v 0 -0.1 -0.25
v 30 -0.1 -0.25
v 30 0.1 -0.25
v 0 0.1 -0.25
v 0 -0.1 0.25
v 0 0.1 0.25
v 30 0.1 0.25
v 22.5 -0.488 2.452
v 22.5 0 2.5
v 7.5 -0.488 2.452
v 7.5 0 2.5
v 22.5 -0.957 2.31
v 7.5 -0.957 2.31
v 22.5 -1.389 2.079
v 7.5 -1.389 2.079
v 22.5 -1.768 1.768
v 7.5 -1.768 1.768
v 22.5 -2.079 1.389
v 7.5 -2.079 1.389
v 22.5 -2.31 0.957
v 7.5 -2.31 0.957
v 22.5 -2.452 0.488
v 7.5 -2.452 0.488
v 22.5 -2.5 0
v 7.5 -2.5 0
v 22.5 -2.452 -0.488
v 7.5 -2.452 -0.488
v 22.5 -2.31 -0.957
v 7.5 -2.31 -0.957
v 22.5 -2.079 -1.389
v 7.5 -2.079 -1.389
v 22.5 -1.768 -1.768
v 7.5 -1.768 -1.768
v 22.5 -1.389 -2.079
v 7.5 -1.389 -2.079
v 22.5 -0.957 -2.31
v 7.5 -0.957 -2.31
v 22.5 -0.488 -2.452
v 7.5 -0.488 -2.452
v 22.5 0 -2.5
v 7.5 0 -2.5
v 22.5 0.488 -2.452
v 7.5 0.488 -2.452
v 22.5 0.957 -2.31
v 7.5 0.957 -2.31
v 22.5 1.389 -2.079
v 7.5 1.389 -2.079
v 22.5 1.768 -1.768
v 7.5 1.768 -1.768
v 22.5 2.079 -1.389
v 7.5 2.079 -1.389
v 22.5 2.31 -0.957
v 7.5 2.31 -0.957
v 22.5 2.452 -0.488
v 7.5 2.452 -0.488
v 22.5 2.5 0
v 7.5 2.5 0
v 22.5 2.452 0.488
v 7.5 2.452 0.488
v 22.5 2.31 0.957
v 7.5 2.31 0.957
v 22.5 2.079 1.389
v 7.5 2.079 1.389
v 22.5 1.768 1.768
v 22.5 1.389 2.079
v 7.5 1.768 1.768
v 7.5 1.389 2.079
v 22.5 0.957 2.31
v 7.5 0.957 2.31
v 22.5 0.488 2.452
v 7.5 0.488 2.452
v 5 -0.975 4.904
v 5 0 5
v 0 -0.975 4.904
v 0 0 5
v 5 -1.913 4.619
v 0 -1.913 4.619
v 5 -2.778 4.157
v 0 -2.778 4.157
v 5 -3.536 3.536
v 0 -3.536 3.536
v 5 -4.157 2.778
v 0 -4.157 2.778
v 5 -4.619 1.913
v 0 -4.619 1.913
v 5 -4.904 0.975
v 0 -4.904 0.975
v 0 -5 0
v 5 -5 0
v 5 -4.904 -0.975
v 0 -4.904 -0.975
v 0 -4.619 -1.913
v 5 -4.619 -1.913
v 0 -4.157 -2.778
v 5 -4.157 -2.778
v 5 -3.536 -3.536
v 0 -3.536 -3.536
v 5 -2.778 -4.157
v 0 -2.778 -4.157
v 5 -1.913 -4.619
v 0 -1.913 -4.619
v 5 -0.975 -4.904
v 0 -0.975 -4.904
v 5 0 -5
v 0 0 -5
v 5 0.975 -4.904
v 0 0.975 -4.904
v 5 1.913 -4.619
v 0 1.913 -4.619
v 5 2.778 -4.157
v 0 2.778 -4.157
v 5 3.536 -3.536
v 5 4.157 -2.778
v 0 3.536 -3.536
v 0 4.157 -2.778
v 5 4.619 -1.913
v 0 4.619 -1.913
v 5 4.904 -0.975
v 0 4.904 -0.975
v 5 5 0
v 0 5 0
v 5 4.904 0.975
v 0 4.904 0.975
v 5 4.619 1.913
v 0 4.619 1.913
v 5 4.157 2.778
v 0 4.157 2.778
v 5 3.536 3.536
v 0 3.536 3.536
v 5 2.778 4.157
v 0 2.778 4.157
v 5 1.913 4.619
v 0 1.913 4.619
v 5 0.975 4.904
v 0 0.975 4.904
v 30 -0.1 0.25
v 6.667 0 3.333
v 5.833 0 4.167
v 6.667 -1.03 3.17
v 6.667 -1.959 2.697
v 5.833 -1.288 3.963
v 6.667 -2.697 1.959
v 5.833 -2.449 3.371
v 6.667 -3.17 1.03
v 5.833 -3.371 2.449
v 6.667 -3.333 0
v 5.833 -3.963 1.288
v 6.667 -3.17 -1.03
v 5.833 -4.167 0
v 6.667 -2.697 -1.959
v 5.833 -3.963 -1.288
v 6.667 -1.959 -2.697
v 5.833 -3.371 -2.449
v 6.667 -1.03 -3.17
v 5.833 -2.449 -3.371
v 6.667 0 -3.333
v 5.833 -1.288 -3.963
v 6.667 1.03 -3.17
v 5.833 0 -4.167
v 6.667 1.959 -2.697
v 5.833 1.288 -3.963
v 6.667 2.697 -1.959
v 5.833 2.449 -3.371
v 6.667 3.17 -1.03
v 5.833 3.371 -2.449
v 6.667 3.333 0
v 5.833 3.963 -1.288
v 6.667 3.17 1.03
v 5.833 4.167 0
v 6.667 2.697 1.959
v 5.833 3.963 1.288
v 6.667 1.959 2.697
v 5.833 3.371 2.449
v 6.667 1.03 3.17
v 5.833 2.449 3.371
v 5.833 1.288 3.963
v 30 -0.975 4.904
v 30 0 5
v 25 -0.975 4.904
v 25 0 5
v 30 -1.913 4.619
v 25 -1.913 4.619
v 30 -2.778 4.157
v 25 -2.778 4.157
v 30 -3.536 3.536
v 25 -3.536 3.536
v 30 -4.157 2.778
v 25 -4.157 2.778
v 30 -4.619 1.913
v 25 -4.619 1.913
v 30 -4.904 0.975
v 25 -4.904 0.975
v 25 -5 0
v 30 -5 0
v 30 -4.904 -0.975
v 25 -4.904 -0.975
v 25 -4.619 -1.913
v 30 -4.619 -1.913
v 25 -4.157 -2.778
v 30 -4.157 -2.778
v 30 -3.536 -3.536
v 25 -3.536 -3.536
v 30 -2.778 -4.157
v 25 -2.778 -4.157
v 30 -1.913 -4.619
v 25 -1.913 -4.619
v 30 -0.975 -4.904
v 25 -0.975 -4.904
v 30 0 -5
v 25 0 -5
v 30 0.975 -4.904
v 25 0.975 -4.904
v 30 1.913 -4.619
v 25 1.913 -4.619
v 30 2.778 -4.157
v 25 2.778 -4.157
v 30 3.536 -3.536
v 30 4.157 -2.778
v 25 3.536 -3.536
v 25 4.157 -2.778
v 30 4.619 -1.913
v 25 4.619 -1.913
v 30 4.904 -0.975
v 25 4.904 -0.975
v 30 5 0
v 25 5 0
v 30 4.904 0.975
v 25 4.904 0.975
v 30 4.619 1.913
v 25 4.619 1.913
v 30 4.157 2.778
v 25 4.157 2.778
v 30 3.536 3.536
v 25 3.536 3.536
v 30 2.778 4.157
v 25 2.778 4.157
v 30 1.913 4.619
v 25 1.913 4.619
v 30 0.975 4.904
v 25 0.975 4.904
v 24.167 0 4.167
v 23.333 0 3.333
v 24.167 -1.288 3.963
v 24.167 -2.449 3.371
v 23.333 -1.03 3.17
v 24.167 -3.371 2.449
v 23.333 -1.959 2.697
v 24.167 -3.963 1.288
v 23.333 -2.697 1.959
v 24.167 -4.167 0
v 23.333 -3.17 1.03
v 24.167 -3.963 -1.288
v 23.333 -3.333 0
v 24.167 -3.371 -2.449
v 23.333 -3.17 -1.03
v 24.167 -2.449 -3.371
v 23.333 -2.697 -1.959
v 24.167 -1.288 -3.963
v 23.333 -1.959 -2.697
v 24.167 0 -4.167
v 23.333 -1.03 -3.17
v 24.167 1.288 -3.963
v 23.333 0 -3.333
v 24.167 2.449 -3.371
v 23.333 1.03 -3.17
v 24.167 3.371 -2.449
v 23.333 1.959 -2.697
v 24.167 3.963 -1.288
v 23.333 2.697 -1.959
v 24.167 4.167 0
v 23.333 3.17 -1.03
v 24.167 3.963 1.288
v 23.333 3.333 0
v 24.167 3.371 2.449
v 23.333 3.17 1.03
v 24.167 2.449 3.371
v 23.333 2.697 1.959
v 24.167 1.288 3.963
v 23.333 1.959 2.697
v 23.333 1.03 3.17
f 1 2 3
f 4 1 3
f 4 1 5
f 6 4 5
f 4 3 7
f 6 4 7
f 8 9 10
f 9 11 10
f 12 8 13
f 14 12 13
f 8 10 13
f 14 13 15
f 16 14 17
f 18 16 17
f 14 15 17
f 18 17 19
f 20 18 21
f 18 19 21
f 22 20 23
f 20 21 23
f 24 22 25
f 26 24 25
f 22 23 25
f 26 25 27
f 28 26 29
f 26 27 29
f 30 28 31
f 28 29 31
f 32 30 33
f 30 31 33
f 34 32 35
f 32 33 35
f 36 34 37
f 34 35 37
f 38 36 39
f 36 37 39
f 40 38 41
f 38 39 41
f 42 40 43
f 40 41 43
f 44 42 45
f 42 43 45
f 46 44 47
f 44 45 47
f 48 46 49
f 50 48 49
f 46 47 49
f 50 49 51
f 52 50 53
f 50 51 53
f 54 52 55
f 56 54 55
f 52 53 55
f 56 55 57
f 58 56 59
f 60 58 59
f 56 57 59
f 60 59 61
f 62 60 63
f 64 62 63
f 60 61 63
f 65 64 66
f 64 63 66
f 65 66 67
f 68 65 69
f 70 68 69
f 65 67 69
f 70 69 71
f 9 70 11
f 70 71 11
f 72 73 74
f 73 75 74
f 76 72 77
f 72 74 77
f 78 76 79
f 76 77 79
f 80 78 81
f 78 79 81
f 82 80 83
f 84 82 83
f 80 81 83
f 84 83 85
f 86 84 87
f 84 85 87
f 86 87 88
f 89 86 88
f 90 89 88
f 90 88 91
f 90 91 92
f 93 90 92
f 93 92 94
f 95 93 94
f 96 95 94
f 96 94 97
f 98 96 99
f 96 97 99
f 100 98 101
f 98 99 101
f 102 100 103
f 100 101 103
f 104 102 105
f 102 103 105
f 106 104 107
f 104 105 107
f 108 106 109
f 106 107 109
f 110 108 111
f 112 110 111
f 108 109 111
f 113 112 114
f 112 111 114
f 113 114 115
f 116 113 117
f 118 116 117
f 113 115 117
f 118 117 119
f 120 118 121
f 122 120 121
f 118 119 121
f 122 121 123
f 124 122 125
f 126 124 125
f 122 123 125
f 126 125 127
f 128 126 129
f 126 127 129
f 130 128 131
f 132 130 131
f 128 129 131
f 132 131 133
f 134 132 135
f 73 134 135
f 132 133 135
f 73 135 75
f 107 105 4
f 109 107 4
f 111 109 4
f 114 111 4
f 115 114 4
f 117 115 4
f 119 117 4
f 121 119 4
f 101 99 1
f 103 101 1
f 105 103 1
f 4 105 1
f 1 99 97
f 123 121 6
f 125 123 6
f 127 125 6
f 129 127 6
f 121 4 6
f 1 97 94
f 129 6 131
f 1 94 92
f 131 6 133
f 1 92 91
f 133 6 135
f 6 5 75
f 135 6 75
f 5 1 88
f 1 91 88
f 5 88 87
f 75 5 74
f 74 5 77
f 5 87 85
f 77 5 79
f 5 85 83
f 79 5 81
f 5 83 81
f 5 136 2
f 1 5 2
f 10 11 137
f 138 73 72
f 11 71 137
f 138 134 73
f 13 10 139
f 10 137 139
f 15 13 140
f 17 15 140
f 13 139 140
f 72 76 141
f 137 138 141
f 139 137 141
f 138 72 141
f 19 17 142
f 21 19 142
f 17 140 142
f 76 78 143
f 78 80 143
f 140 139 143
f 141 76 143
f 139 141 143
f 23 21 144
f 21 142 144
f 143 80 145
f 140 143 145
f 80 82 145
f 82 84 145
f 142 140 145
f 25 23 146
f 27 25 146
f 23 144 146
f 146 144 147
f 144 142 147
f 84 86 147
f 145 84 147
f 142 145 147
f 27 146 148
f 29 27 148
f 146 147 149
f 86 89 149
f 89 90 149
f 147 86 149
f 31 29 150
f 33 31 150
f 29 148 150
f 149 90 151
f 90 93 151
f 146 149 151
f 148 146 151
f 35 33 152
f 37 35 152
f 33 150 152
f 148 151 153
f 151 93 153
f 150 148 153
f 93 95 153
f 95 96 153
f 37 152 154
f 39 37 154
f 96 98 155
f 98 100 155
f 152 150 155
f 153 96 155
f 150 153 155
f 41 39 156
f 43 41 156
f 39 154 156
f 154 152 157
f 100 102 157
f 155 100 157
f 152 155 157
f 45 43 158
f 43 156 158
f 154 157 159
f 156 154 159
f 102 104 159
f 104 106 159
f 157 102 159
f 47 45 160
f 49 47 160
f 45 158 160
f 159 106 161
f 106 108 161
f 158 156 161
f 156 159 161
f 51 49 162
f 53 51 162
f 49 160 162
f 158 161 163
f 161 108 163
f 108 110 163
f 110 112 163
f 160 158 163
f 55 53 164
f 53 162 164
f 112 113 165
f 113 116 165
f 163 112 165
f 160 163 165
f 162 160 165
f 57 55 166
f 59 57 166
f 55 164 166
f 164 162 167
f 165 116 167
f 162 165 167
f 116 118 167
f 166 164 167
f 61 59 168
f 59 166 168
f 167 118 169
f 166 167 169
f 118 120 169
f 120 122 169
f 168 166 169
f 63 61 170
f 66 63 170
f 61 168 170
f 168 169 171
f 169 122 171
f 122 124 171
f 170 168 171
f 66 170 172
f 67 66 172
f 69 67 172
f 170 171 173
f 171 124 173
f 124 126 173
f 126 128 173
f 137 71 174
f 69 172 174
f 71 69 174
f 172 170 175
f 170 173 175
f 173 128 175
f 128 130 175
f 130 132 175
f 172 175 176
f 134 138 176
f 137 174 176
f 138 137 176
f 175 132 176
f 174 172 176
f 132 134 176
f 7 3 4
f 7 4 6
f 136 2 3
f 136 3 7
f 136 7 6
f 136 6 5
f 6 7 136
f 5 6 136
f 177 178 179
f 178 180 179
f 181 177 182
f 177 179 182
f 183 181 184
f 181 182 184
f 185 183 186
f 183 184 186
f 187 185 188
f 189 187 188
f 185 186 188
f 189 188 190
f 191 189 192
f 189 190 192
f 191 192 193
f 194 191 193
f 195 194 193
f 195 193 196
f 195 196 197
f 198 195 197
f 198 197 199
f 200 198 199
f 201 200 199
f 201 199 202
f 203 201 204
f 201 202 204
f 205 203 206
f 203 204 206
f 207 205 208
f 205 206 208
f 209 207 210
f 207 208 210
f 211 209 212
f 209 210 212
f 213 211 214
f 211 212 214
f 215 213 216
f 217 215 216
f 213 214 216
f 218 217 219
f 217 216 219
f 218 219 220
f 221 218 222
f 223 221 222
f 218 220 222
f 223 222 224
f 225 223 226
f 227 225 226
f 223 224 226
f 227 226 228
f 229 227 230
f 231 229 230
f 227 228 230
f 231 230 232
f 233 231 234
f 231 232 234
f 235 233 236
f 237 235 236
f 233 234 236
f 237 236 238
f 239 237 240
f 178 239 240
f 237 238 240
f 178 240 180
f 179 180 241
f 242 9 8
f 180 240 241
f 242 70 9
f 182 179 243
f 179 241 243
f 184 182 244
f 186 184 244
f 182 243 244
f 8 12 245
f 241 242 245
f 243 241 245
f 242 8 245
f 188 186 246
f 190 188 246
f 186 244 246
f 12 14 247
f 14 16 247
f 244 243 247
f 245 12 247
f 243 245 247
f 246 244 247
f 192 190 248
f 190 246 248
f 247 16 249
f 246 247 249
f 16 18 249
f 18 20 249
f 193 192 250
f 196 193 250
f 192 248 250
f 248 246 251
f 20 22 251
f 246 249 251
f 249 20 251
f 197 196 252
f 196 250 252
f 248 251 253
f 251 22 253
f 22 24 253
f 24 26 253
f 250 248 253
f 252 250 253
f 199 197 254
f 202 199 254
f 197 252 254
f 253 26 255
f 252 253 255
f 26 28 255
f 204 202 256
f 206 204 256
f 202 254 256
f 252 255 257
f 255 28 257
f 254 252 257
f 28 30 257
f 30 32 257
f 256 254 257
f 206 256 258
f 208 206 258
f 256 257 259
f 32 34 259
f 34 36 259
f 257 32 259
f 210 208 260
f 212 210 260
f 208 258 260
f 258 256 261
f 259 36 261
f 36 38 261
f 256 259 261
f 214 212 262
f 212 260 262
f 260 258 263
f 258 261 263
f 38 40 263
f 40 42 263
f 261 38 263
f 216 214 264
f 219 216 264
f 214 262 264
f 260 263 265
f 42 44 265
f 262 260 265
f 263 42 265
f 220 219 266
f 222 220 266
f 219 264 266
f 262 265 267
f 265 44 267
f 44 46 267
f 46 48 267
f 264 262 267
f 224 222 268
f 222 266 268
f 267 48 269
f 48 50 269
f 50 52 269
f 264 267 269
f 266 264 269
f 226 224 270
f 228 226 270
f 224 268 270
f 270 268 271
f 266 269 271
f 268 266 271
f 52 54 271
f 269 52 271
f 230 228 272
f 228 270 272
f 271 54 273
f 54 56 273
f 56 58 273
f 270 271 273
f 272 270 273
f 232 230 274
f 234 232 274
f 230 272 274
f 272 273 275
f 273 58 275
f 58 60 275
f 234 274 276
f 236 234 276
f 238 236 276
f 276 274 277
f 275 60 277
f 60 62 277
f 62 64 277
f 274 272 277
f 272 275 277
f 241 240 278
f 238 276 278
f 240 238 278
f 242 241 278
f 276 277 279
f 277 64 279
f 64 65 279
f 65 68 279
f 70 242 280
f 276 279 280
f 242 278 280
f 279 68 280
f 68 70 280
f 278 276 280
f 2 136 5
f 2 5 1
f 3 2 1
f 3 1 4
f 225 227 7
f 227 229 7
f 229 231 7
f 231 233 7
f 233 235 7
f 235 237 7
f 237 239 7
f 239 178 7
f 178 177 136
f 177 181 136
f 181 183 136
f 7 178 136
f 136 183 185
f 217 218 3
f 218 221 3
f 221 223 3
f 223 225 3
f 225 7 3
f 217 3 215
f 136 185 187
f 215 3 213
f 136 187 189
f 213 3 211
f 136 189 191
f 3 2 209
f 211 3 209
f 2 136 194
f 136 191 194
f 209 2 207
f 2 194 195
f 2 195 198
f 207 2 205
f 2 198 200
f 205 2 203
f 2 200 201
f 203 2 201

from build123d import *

# Parameters (mm, degrees)
F3_W = 0.2
F3_H = 0.5


with BuildPart() as f1:
    # F0 (on Front) → F1 (revolve)
    with BuildSketch(Plane.XZ):
        Polygon((0, 5), (0, 0), (30, 0), (30, 5), (25, 5), (22.5, 2.5), (7.5, 2.5), (5, 5), align=None)
    revolve(axis=Axis((15, 0, 0), (1, 0, 0)))

    # F5: sweep along a path in F2
    with BuildLine(Plane.XZ) as f5_path:
        Line((0, 0), (30, 0))
    # F3 (on face) → F5 (sweep, cut)
    with BuildSketch(Plane.YZ.offset(30)):
        Rectangle(F3_W, F3_H)
    sweep(path=f5_path.line, mode=Mode.SUBTRACT)


with BuildPart() as f4:
    # F4: sweep along a path in F2
    with BuildLine(Plane.XZ) as f4_path:
        Line((0, 0), (30, 0))
    # F3 (on face) → F4 (sweep)
    with BuildSketch(Plane.YZ.offset(30)):
        Rectangle(F3_W, F3_H)
    sweep(path=f4_path.line)


solid = Compound([f1.part, f4.part])
